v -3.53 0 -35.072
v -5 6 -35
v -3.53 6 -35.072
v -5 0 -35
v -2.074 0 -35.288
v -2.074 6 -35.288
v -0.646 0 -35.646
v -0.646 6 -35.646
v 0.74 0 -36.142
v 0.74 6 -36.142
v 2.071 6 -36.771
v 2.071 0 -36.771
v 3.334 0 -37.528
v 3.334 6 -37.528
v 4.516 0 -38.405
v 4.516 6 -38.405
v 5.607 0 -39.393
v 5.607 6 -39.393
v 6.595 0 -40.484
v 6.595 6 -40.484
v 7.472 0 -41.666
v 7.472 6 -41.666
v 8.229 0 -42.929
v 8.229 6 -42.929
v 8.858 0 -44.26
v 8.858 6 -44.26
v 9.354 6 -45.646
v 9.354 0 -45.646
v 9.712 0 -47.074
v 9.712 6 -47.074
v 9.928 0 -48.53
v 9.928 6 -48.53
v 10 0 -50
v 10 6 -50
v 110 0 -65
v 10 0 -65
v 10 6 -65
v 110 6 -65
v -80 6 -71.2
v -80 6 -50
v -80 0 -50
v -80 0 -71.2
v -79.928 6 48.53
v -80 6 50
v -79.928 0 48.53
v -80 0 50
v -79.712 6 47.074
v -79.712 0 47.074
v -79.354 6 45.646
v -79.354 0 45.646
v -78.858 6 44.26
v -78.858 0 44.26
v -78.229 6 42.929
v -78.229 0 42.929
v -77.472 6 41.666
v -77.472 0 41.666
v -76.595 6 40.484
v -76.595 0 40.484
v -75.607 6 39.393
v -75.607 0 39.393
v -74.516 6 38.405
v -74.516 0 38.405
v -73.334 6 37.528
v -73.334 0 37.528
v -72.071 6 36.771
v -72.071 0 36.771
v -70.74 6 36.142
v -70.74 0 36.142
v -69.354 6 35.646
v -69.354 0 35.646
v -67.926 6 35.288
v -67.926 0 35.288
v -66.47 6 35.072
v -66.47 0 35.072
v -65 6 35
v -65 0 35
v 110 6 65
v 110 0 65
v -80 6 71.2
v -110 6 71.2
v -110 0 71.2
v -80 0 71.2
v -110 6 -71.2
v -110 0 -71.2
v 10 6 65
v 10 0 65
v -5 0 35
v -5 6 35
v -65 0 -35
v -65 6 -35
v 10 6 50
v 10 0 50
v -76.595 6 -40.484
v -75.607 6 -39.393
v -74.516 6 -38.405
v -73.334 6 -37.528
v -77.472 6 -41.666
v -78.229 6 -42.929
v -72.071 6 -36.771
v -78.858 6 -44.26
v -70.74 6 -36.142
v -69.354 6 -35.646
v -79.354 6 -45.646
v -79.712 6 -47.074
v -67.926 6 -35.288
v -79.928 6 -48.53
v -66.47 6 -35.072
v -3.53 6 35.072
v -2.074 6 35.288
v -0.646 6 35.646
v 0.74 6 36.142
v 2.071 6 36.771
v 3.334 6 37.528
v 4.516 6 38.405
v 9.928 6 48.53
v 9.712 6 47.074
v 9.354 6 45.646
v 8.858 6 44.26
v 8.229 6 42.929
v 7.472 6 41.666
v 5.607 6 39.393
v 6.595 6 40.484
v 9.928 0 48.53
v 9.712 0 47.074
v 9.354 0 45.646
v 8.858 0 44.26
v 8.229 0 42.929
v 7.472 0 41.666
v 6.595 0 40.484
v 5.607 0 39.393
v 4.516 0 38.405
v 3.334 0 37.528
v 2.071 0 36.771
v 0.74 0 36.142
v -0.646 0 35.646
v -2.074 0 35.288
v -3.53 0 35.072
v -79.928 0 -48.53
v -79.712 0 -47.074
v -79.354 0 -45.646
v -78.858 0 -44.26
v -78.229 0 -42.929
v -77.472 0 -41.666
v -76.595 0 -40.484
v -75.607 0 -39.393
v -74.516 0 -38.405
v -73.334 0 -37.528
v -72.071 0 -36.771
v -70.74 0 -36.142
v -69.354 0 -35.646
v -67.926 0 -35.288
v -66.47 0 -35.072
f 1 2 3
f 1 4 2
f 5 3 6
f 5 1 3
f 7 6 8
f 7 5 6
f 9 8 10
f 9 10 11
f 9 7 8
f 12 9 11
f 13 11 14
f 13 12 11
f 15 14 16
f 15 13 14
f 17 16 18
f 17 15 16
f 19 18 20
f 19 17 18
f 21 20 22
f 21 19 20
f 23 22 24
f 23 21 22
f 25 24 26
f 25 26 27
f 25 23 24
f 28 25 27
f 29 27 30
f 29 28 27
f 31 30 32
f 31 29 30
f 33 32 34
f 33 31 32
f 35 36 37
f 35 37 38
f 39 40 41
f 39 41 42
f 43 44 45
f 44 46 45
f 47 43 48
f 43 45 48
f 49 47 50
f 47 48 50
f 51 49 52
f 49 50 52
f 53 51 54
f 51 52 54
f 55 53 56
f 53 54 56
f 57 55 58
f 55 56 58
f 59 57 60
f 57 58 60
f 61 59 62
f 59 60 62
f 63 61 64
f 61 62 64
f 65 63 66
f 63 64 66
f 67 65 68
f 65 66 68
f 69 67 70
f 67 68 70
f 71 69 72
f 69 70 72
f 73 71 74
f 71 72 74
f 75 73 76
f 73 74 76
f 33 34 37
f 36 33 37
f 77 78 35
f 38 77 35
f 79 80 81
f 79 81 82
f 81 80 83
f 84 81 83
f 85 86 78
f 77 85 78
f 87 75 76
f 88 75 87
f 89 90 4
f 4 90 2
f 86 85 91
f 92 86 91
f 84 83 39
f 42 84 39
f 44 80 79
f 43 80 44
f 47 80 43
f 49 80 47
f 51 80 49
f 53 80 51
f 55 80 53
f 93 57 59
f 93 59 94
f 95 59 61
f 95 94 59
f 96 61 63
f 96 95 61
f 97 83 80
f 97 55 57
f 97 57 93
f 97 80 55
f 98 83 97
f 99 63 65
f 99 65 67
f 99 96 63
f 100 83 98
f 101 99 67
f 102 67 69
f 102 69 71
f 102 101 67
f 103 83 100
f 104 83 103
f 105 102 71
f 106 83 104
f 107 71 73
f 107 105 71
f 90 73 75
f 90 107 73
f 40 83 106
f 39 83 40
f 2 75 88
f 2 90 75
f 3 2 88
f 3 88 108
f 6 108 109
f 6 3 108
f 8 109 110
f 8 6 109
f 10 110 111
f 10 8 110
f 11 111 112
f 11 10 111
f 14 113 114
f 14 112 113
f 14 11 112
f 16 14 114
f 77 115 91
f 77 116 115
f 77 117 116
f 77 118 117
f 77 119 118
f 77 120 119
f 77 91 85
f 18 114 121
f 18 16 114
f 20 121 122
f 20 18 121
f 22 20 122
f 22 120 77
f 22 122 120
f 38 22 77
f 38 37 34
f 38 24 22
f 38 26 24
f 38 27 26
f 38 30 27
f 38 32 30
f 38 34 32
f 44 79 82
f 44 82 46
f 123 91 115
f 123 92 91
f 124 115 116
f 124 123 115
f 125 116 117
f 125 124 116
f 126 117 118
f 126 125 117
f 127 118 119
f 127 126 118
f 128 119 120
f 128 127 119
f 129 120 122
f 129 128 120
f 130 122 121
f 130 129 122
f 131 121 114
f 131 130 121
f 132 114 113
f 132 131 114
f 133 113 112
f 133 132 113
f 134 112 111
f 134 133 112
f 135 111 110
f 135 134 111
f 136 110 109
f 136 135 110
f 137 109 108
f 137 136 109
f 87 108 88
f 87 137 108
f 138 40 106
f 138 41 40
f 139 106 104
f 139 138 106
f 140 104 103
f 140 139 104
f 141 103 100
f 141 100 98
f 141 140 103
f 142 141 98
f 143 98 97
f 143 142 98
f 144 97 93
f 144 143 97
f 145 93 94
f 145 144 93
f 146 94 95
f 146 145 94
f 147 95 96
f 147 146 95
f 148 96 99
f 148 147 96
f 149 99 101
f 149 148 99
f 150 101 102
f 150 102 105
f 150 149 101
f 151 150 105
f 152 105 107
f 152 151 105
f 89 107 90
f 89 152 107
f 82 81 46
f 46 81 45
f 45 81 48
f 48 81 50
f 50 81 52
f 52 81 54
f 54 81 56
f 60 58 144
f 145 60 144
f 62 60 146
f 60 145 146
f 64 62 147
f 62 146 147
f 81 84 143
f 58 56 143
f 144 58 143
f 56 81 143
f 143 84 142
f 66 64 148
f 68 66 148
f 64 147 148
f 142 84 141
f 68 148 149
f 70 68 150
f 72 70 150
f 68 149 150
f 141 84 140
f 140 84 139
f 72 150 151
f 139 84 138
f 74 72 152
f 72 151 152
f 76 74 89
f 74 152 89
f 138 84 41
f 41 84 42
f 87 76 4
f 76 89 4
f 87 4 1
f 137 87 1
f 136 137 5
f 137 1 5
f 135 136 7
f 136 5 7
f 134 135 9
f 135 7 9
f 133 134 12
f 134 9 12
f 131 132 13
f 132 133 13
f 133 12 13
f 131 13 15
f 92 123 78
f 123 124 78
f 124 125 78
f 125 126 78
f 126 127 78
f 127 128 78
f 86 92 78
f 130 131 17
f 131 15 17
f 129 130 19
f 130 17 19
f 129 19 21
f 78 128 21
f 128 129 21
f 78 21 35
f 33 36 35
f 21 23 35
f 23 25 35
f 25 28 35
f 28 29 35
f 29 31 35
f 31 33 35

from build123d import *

# Parameters (mm, degrees)
SKETCH1_W           = 220
SKETCH1_H           = 130
BOSS_EXTRUDE1_DEPTH = 6
SKETCH2_W           = 90
SKETCH2_H           = 30
CUT_EXTRUDE1_DEPTH  = 128.910124697
FILLET1_R           = 15
SKETCH3_W           = 30
SKETCH3_H           = 6.2
BOSS_EXTRUDE2_DEPTH = 6


with BuildPart() as part:
    # Sketch1 → Boss-Extrude1 (new body)
    with BuildSketch(Plane(origin=(0, 0, 0), x_dir=(1, 0, 0), z_dir=(0, 1, 0))):
        Rectangle(SKETCH1_W, SKETCH1_H)
    extrude(amount=BOSS_EXTRUDE1_DEPTH)

    # Sketch2 → Cut-Extrude1 (cut, through all)
    with BuildSketch(Plane(origin=(0, 6, 0), x_dir=(1, 0, 0), z_dir=(0, 1, 0))):
        with Locations((-35, -50)):
            Rectangle(SKETCH2_W, SKETCH2_H)
        with Locations((-35, 50)):
            Rectangle(SKETCH2_W, SKETCH2_H)
    extrude(amount=-CUT_EXTRUDE1_DEPTH, mode=Mode.SUBTRACT)

    # Fillet1
    fillet1_edges = [part.edges().sort_by_distance(p)[0] for p in [
        (-80, 3, 35),
        (10, 3, 35),
        (-80, 3, -35),
        (10, 3, -35),
    ]]
    fillet(fillet1_edges, radius=FILLET1_R)

    # Sketch3 → Boss-Extrude2 (add)
    with BuildSketch(Plane(origin=(0, 6, 0), x_dir=(1, 0, 0), z_dir=(0, 1, 0))):
        with Locations((-95, 68.1)):
            Rectangle(SKETCH3_W, SKETCH3_H)
        with Locations((-95, -68.1)):
            Rectangle(SKETCH3_W, SKETCH3_H)
    extrude(amount=-BOSS_EXTRUDE2_DEPTH)


solid = part.part
